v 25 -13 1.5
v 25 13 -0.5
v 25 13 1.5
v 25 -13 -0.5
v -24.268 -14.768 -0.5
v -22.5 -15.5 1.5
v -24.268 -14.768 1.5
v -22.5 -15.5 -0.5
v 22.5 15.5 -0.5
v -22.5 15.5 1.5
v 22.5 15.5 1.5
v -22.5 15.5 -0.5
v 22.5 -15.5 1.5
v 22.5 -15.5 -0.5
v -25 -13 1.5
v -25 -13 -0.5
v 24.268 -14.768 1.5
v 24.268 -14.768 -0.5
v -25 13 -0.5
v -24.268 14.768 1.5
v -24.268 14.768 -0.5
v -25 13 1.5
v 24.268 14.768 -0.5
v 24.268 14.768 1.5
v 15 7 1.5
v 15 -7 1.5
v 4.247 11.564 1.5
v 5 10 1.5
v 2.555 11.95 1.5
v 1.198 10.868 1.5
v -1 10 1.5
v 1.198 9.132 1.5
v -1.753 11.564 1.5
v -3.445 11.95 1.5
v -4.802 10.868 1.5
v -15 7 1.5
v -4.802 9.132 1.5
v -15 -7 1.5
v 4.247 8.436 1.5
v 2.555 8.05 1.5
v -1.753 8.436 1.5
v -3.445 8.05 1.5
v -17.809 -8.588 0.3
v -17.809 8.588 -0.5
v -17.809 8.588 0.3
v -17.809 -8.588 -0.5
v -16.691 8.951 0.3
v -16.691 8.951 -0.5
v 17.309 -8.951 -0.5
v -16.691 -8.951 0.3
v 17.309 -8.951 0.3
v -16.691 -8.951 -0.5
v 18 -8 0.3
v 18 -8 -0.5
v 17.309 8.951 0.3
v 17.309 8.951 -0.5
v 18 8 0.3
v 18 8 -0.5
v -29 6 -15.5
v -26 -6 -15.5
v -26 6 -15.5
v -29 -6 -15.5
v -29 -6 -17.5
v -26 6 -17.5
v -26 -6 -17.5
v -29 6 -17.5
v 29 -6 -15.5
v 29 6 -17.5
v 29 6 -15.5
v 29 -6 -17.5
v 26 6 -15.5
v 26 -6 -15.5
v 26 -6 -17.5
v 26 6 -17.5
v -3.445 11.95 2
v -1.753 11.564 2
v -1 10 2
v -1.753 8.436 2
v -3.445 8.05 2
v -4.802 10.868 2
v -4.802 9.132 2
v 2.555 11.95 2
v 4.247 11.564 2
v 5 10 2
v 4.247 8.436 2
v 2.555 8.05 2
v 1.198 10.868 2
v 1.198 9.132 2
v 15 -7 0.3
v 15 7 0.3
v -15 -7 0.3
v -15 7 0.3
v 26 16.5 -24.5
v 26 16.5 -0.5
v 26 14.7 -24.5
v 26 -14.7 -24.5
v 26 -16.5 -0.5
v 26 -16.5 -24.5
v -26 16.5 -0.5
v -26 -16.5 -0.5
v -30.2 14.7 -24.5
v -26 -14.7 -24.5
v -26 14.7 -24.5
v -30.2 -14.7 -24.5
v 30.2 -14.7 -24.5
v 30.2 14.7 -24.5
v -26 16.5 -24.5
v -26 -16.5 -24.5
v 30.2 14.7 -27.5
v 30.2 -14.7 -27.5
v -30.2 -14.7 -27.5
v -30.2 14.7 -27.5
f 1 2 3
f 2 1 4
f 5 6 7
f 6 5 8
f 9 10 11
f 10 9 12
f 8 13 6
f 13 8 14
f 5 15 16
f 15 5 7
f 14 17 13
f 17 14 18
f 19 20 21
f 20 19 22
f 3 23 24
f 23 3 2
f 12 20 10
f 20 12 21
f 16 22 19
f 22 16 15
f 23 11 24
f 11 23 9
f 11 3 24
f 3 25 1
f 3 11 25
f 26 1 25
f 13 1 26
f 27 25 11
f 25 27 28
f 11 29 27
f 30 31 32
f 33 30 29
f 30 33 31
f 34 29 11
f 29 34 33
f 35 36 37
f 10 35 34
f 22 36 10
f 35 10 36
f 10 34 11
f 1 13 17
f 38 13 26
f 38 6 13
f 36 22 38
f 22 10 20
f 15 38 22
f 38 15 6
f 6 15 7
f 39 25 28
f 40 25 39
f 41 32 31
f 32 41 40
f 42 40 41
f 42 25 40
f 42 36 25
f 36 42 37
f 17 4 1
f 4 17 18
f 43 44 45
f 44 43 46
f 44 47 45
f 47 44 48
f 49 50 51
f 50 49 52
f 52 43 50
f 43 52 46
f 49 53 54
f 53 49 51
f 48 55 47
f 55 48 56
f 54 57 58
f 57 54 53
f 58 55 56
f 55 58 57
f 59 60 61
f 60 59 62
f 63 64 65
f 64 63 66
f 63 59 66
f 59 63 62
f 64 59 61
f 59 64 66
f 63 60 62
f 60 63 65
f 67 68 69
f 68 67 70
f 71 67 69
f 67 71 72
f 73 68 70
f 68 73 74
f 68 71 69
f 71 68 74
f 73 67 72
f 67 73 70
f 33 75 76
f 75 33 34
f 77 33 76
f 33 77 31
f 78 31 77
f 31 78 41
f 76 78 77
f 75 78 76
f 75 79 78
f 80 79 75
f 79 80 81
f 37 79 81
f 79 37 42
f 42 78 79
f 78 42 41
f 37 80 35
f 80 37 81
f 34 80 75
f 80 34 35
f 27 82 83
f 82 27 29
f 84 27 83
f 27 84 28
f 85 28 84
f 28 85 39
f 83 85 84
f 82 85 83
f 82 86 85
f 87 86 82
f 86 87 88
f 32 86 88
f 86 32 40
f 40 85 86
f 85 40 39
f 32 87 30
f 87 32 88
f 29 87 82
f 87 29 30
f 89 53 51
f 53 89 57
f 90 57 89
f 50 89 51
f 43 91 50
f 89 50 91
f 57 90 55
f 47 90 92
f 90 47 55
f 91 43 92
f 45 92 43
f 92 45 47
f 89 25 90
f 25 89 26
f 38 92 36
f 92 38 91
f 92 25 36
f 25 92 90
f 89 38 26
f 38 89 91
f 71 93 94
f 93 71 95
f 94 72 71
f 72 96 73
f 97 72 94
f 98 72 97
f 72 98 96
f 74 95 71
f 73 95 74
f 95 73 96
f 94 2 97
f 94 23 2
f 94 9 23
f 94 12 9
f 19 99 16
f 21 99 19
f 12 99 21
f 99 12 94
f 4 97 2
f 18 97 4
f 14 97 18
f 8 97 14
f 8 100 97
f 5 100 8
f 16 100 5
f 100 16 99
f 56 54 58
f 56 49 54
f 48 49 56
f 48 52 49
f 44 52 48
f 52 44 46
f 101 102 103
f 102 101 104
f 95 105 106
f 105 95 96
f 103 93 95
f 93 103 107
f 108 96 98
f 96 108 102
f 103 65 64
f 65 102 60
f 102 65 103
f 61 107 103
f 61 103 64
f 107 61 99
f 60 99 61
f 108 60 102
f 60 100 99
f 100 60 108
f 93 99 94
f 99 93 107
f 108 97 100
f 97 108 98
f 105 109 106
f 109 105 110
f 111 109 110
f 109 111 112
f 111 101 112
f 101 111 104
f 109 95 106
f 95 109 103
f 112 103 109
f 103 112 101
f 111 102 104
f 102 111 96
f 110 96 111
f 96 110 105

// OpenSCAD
// Parameters
module_variant = 1; //[1:1:1]
overall_size_x_mm = 48; //[24:96:1]
overall_size_y_mm = 29; //[15:58:1]
overall_size_z_mm = 25; //[12:50:1]
bezel_size_x_mm = 50; //[25:100:1]
bezel_size_y_mm = 31; //[16:62:1]
bezel_size_z_mm = 3; //[1.5:8:0.5]
bezel_corner_radius_mm = 2.5; //[0:6:0.5]
bezel_bevel_mm = 1; //[0:3:0.5]
body_depth_mm = 22; //[10:44:1]
wall_thickness_mm = 1.5; //[0:4:0.5]
display_aperture_x_mm = 36; //[18:72:1]
display_aperture_y_mm = 18; //[9:36:1]
aperture_corner_radius_mm = 1; //[0:4:0.5]
inner_aperture_x_mm = 30; //[15:60:1]
inner_aperture_y_mm = 14; //[7:28:1]
inner_aperture_z_mm = 1.2; //[0:4:0.2]
inner_aperture_offset_x_mm = 0; //[-5:5:0.5]
inner_aperture_offset_y_mm = 0; //[-5:5:0.5]
tab_size_x_mm = 6; //[3:12:0.5]
tab_size_y_mm = 12; //[6:24:1]
tab_size_z_mm = 2; //[1:5:0.5]
tab_offset_z_mm = 6; //[0:20:1]
pcb_size_x_mm = 44; //[22:88:1]
pcb_size_y_mm = 25; //[12:50:1]
pcb_thickness_mm = 1.6; //[0.8:3.2:0.1]
pcb_offset_z_mm = 6; //[0:20:1]
button_diameter_mm = 4; //[2:8:0.5]
button_height_mm = 1.5; //[0.5:5:0.5]
button_spacing_x_mm = 6; //[3:15:0.5]
button_row_offset_y_mm = 10; //[0:20:0.5]
panel_cutout_clearance_mm = 0.2; //[0:1:0.05]
cutout_extrusion_height_mm = 3; //[0:20:1]
rear_clearance_extra_mm = 2; //[0:10:0.5]
overlap_mm = 1; //[0.5:2:0.5]

// Bezel with display aperture
module bezel_with_aperture() {
  color("Black") {
    difference() {
      hull() {
        translate([bezel_size_x_mm/2 - bezel_corner_radius_mm, bezel_size_y_mm/2 - bezel_corner_radius_mm, 0])
          cylinder(r=bezel_corner_radius_mm, h=bezel_size_z_mm, center=true);
        translate([-(bezel_size_x_mm/2 - bezel_corner_radius_mm), bezel_size_y_mm/2 - bezel_corner_radius_mm, 0])
          cylinder(r=bezel_corner_radius_mm, h=bezel_size_z_mm, center=true);
        translate([bezel_size_x_mm/2 - bezel_corner_radius_mm, -(bezel_size_y_mm/2 - bezel_corner_radius_mm), 0])
          cylinder(r=bezel_corner_radius_mm, h=bezel_size_z_mm, center=true);
        translate([-(bezel_size_x_mm/2 - bezel_corner_radius_mm), -(bezel_size_y_mm/2 - bezel_corner_radius_mm), 0])
          cylinder(r=bezel_corner_radius_mm, h=bezel_size_z_mm, center=true);
      }
      hull() {
        translate([display_aperture_x_mm/2 - aperture_corner_radius_mm, display_aperture_y_mm/2 - aperture_corner_radius_mm, 0])
          cylinder(r=aperture_corner_radius_mm, h=bezel_size_z_mm + 2*overlap_mm, center=true);
        translate([-(display_aperture_x_mm/2 - aperture_corner_radius_mm), display_aperture_y_mm/2 - aperture_corner_radius_mm, 0])
          cylinder(r=aperture_corner_radius_mm, h=bezel_size_z_mm + 2*overlap_mm, center=true);
        translate([display_aperture_x_mm/2 - aperture_corner_radius_mm, -(display_aperture_y_mm/2 - aperture_corner_radius_mm), 0])
          cylinder(r=aperture_corner_radius_mm, h=bezel_size_z_mm + 2*overlap_mm, center=true);
        translate([-(display_aperture_x_mm/2 - aperture_corner_radius_mm), -(display_aperture_y_mm/2 - aperture_corner_radius_mm), 0])
          cylinder(r=aperture_corner_radius_mm, h=bezel_size_z_mm + 2*overlap_mm, center=true);
      }
    }
  }
}

// Main body housing
module main_body_housing() {
  color("DimGray") {
    difference() {
      translate([0, 0, -(bezel_size_z_mm/2 + body_depth_mm/2 - overlap_mm)])
        cube([overall_size_x_mm, overall_size_y_mm, body_depth_mm], center=true);
      translate([0, 0, -(bezel_size_z_mm/2 + body_depth_mm/2 - overlap_mm) + wall_thickness_mm/2])
        cube([overall_size_x_mm - 2*wall_thickness_mm, overall_size_y_mm - 2*wall_thickness_mm, body_depth_mm - wall_thickness_mm], center=true);
    }
  }
}

// Panel mount tabs or clips
module panel_mount_tabs_or_clips() {
  color("Silver") {
    union() {
      translate([-(overall_size_x_mm/2 + tab_size_x_mm/2 - overlap_mm), 0, -(bezel_size_z_mm/2 + body_depth_mm - tab_offset_z_mm - tab_size_z_mm/2)])
        cube([tab_size_x_mm, tab_size_y_mm, tab_size_z_mm], center=true);
      translate([overall_size_x_mm/2 + tab_size_x_mm/2 - overlap_mm, 0, -(bezel_size_z_mm/2 + body_depth_mm - tab_offset_z_mm - tab_size_z_mm/2)])
        cube([tab_size_x_mm, tab_size_y_mm, tab_size_z_mm], center=true);
    }
  }
}

// PCB representation
module pcb_representation() {
  color([0.0, 0.4, 0.2]) {
    translate([0, 0, -(bezel_size_z_mm/2 + body_depth_mm - pcb_offset_z_mm - pcb_thickness_mm/2)])
      cube([pcb_size_x_mm, pcb_size_y_mm, pcb_thickness_mm], center=true);
  }
}

// Panel meter buttons
module panel_meter_button() {
  color("White") {
    union() {
      translate([-button_spacing_x_mm/2, button_row_offset_y_mm, bezel_size_z_mm/2 + button_height_mm/2 - overlap_mm])
        cylinder(r=button_diameter_mm/2, h=button_height_mm, center=true);
      translate([button_spacing_x_mm/2, button_row_offset_y_mm, bezel_size_z_mm/2 + button_height_mm/2 - overlap_mm])
        cylinder(r=button_diameter_mm/2, h=button_height_mm, center=true);
    }
  }
}

// Inner aperture frame
module inner_aperture_frame() {
  color("Black") {
    difference() {
      translate([inner_aperture_offset_x_mm, inner_aperture_offset_y_mm, bezel_size_z_mm/2 - inner_aperture_z_mm/2])
        cube([display_aperture_x_mm, display_aperture_y_mm, inner_aperture_z_mm], center=true);
      translate([inner_aperture_offset_x_mm, inner_aperture_offset_y_mm, bezel_size_z_mm/2 - inner_aperture_z_mm/2])
        cube([inner_aperture_x_mm, inner_aperture_y_mm, inner_aperture_z_mm + 2*overlap_mm], center=true);
    }
  }
}

// Panel meter
module panel_meter() {
  union() {
    bezel_with_aperture();
    main_body_housing();
    panel_mount_tabs_or_clips();
    pcb_representation();
    panel_meter_button();
    inner_aperture_frame();
  }
}

// Rear clearance volume
module rear_clearance_volume() {
  color([0.85, 0.85, 0.8, 0.5]) {
    translate([0, 0, -(bezel_size_z_mm/2 + (body_depth_mm + rear_clearance_extra_mm)/2 - overlap_mm)])
      cube([overall_size_x_mm + 2*rear_clearance_extra_mm, overall_size_y_mm + 2*rear_clearance_extra_mm, body_depth_mm + rear_clearance_extra_mm], center=true);
  }
}

// Mod
module mod() {
  union() {
    panel_meter();
    rear_clearance_volume();
  }
}

// Panel meter cutout
module panel_meter_cutout() {
  color("Black") {
    translate([0, 0, -(bezel_size_z_mm/2 + body_depth_mm + cutout_extrusion_height_mm/2 + overlap_mm)])
      cube([overall_size_x_mm + 2*panel_cutout_clearance_mm + 2*tab_size_x_mm, overall_size_y_mm + 2*panel_cutout_clearance_mm, cutout_extrusion_height_mm], center=true);
  }
}

// Assembly
module assembly() {
  mod();
  panel_meter_cutout();
}

assembly();
